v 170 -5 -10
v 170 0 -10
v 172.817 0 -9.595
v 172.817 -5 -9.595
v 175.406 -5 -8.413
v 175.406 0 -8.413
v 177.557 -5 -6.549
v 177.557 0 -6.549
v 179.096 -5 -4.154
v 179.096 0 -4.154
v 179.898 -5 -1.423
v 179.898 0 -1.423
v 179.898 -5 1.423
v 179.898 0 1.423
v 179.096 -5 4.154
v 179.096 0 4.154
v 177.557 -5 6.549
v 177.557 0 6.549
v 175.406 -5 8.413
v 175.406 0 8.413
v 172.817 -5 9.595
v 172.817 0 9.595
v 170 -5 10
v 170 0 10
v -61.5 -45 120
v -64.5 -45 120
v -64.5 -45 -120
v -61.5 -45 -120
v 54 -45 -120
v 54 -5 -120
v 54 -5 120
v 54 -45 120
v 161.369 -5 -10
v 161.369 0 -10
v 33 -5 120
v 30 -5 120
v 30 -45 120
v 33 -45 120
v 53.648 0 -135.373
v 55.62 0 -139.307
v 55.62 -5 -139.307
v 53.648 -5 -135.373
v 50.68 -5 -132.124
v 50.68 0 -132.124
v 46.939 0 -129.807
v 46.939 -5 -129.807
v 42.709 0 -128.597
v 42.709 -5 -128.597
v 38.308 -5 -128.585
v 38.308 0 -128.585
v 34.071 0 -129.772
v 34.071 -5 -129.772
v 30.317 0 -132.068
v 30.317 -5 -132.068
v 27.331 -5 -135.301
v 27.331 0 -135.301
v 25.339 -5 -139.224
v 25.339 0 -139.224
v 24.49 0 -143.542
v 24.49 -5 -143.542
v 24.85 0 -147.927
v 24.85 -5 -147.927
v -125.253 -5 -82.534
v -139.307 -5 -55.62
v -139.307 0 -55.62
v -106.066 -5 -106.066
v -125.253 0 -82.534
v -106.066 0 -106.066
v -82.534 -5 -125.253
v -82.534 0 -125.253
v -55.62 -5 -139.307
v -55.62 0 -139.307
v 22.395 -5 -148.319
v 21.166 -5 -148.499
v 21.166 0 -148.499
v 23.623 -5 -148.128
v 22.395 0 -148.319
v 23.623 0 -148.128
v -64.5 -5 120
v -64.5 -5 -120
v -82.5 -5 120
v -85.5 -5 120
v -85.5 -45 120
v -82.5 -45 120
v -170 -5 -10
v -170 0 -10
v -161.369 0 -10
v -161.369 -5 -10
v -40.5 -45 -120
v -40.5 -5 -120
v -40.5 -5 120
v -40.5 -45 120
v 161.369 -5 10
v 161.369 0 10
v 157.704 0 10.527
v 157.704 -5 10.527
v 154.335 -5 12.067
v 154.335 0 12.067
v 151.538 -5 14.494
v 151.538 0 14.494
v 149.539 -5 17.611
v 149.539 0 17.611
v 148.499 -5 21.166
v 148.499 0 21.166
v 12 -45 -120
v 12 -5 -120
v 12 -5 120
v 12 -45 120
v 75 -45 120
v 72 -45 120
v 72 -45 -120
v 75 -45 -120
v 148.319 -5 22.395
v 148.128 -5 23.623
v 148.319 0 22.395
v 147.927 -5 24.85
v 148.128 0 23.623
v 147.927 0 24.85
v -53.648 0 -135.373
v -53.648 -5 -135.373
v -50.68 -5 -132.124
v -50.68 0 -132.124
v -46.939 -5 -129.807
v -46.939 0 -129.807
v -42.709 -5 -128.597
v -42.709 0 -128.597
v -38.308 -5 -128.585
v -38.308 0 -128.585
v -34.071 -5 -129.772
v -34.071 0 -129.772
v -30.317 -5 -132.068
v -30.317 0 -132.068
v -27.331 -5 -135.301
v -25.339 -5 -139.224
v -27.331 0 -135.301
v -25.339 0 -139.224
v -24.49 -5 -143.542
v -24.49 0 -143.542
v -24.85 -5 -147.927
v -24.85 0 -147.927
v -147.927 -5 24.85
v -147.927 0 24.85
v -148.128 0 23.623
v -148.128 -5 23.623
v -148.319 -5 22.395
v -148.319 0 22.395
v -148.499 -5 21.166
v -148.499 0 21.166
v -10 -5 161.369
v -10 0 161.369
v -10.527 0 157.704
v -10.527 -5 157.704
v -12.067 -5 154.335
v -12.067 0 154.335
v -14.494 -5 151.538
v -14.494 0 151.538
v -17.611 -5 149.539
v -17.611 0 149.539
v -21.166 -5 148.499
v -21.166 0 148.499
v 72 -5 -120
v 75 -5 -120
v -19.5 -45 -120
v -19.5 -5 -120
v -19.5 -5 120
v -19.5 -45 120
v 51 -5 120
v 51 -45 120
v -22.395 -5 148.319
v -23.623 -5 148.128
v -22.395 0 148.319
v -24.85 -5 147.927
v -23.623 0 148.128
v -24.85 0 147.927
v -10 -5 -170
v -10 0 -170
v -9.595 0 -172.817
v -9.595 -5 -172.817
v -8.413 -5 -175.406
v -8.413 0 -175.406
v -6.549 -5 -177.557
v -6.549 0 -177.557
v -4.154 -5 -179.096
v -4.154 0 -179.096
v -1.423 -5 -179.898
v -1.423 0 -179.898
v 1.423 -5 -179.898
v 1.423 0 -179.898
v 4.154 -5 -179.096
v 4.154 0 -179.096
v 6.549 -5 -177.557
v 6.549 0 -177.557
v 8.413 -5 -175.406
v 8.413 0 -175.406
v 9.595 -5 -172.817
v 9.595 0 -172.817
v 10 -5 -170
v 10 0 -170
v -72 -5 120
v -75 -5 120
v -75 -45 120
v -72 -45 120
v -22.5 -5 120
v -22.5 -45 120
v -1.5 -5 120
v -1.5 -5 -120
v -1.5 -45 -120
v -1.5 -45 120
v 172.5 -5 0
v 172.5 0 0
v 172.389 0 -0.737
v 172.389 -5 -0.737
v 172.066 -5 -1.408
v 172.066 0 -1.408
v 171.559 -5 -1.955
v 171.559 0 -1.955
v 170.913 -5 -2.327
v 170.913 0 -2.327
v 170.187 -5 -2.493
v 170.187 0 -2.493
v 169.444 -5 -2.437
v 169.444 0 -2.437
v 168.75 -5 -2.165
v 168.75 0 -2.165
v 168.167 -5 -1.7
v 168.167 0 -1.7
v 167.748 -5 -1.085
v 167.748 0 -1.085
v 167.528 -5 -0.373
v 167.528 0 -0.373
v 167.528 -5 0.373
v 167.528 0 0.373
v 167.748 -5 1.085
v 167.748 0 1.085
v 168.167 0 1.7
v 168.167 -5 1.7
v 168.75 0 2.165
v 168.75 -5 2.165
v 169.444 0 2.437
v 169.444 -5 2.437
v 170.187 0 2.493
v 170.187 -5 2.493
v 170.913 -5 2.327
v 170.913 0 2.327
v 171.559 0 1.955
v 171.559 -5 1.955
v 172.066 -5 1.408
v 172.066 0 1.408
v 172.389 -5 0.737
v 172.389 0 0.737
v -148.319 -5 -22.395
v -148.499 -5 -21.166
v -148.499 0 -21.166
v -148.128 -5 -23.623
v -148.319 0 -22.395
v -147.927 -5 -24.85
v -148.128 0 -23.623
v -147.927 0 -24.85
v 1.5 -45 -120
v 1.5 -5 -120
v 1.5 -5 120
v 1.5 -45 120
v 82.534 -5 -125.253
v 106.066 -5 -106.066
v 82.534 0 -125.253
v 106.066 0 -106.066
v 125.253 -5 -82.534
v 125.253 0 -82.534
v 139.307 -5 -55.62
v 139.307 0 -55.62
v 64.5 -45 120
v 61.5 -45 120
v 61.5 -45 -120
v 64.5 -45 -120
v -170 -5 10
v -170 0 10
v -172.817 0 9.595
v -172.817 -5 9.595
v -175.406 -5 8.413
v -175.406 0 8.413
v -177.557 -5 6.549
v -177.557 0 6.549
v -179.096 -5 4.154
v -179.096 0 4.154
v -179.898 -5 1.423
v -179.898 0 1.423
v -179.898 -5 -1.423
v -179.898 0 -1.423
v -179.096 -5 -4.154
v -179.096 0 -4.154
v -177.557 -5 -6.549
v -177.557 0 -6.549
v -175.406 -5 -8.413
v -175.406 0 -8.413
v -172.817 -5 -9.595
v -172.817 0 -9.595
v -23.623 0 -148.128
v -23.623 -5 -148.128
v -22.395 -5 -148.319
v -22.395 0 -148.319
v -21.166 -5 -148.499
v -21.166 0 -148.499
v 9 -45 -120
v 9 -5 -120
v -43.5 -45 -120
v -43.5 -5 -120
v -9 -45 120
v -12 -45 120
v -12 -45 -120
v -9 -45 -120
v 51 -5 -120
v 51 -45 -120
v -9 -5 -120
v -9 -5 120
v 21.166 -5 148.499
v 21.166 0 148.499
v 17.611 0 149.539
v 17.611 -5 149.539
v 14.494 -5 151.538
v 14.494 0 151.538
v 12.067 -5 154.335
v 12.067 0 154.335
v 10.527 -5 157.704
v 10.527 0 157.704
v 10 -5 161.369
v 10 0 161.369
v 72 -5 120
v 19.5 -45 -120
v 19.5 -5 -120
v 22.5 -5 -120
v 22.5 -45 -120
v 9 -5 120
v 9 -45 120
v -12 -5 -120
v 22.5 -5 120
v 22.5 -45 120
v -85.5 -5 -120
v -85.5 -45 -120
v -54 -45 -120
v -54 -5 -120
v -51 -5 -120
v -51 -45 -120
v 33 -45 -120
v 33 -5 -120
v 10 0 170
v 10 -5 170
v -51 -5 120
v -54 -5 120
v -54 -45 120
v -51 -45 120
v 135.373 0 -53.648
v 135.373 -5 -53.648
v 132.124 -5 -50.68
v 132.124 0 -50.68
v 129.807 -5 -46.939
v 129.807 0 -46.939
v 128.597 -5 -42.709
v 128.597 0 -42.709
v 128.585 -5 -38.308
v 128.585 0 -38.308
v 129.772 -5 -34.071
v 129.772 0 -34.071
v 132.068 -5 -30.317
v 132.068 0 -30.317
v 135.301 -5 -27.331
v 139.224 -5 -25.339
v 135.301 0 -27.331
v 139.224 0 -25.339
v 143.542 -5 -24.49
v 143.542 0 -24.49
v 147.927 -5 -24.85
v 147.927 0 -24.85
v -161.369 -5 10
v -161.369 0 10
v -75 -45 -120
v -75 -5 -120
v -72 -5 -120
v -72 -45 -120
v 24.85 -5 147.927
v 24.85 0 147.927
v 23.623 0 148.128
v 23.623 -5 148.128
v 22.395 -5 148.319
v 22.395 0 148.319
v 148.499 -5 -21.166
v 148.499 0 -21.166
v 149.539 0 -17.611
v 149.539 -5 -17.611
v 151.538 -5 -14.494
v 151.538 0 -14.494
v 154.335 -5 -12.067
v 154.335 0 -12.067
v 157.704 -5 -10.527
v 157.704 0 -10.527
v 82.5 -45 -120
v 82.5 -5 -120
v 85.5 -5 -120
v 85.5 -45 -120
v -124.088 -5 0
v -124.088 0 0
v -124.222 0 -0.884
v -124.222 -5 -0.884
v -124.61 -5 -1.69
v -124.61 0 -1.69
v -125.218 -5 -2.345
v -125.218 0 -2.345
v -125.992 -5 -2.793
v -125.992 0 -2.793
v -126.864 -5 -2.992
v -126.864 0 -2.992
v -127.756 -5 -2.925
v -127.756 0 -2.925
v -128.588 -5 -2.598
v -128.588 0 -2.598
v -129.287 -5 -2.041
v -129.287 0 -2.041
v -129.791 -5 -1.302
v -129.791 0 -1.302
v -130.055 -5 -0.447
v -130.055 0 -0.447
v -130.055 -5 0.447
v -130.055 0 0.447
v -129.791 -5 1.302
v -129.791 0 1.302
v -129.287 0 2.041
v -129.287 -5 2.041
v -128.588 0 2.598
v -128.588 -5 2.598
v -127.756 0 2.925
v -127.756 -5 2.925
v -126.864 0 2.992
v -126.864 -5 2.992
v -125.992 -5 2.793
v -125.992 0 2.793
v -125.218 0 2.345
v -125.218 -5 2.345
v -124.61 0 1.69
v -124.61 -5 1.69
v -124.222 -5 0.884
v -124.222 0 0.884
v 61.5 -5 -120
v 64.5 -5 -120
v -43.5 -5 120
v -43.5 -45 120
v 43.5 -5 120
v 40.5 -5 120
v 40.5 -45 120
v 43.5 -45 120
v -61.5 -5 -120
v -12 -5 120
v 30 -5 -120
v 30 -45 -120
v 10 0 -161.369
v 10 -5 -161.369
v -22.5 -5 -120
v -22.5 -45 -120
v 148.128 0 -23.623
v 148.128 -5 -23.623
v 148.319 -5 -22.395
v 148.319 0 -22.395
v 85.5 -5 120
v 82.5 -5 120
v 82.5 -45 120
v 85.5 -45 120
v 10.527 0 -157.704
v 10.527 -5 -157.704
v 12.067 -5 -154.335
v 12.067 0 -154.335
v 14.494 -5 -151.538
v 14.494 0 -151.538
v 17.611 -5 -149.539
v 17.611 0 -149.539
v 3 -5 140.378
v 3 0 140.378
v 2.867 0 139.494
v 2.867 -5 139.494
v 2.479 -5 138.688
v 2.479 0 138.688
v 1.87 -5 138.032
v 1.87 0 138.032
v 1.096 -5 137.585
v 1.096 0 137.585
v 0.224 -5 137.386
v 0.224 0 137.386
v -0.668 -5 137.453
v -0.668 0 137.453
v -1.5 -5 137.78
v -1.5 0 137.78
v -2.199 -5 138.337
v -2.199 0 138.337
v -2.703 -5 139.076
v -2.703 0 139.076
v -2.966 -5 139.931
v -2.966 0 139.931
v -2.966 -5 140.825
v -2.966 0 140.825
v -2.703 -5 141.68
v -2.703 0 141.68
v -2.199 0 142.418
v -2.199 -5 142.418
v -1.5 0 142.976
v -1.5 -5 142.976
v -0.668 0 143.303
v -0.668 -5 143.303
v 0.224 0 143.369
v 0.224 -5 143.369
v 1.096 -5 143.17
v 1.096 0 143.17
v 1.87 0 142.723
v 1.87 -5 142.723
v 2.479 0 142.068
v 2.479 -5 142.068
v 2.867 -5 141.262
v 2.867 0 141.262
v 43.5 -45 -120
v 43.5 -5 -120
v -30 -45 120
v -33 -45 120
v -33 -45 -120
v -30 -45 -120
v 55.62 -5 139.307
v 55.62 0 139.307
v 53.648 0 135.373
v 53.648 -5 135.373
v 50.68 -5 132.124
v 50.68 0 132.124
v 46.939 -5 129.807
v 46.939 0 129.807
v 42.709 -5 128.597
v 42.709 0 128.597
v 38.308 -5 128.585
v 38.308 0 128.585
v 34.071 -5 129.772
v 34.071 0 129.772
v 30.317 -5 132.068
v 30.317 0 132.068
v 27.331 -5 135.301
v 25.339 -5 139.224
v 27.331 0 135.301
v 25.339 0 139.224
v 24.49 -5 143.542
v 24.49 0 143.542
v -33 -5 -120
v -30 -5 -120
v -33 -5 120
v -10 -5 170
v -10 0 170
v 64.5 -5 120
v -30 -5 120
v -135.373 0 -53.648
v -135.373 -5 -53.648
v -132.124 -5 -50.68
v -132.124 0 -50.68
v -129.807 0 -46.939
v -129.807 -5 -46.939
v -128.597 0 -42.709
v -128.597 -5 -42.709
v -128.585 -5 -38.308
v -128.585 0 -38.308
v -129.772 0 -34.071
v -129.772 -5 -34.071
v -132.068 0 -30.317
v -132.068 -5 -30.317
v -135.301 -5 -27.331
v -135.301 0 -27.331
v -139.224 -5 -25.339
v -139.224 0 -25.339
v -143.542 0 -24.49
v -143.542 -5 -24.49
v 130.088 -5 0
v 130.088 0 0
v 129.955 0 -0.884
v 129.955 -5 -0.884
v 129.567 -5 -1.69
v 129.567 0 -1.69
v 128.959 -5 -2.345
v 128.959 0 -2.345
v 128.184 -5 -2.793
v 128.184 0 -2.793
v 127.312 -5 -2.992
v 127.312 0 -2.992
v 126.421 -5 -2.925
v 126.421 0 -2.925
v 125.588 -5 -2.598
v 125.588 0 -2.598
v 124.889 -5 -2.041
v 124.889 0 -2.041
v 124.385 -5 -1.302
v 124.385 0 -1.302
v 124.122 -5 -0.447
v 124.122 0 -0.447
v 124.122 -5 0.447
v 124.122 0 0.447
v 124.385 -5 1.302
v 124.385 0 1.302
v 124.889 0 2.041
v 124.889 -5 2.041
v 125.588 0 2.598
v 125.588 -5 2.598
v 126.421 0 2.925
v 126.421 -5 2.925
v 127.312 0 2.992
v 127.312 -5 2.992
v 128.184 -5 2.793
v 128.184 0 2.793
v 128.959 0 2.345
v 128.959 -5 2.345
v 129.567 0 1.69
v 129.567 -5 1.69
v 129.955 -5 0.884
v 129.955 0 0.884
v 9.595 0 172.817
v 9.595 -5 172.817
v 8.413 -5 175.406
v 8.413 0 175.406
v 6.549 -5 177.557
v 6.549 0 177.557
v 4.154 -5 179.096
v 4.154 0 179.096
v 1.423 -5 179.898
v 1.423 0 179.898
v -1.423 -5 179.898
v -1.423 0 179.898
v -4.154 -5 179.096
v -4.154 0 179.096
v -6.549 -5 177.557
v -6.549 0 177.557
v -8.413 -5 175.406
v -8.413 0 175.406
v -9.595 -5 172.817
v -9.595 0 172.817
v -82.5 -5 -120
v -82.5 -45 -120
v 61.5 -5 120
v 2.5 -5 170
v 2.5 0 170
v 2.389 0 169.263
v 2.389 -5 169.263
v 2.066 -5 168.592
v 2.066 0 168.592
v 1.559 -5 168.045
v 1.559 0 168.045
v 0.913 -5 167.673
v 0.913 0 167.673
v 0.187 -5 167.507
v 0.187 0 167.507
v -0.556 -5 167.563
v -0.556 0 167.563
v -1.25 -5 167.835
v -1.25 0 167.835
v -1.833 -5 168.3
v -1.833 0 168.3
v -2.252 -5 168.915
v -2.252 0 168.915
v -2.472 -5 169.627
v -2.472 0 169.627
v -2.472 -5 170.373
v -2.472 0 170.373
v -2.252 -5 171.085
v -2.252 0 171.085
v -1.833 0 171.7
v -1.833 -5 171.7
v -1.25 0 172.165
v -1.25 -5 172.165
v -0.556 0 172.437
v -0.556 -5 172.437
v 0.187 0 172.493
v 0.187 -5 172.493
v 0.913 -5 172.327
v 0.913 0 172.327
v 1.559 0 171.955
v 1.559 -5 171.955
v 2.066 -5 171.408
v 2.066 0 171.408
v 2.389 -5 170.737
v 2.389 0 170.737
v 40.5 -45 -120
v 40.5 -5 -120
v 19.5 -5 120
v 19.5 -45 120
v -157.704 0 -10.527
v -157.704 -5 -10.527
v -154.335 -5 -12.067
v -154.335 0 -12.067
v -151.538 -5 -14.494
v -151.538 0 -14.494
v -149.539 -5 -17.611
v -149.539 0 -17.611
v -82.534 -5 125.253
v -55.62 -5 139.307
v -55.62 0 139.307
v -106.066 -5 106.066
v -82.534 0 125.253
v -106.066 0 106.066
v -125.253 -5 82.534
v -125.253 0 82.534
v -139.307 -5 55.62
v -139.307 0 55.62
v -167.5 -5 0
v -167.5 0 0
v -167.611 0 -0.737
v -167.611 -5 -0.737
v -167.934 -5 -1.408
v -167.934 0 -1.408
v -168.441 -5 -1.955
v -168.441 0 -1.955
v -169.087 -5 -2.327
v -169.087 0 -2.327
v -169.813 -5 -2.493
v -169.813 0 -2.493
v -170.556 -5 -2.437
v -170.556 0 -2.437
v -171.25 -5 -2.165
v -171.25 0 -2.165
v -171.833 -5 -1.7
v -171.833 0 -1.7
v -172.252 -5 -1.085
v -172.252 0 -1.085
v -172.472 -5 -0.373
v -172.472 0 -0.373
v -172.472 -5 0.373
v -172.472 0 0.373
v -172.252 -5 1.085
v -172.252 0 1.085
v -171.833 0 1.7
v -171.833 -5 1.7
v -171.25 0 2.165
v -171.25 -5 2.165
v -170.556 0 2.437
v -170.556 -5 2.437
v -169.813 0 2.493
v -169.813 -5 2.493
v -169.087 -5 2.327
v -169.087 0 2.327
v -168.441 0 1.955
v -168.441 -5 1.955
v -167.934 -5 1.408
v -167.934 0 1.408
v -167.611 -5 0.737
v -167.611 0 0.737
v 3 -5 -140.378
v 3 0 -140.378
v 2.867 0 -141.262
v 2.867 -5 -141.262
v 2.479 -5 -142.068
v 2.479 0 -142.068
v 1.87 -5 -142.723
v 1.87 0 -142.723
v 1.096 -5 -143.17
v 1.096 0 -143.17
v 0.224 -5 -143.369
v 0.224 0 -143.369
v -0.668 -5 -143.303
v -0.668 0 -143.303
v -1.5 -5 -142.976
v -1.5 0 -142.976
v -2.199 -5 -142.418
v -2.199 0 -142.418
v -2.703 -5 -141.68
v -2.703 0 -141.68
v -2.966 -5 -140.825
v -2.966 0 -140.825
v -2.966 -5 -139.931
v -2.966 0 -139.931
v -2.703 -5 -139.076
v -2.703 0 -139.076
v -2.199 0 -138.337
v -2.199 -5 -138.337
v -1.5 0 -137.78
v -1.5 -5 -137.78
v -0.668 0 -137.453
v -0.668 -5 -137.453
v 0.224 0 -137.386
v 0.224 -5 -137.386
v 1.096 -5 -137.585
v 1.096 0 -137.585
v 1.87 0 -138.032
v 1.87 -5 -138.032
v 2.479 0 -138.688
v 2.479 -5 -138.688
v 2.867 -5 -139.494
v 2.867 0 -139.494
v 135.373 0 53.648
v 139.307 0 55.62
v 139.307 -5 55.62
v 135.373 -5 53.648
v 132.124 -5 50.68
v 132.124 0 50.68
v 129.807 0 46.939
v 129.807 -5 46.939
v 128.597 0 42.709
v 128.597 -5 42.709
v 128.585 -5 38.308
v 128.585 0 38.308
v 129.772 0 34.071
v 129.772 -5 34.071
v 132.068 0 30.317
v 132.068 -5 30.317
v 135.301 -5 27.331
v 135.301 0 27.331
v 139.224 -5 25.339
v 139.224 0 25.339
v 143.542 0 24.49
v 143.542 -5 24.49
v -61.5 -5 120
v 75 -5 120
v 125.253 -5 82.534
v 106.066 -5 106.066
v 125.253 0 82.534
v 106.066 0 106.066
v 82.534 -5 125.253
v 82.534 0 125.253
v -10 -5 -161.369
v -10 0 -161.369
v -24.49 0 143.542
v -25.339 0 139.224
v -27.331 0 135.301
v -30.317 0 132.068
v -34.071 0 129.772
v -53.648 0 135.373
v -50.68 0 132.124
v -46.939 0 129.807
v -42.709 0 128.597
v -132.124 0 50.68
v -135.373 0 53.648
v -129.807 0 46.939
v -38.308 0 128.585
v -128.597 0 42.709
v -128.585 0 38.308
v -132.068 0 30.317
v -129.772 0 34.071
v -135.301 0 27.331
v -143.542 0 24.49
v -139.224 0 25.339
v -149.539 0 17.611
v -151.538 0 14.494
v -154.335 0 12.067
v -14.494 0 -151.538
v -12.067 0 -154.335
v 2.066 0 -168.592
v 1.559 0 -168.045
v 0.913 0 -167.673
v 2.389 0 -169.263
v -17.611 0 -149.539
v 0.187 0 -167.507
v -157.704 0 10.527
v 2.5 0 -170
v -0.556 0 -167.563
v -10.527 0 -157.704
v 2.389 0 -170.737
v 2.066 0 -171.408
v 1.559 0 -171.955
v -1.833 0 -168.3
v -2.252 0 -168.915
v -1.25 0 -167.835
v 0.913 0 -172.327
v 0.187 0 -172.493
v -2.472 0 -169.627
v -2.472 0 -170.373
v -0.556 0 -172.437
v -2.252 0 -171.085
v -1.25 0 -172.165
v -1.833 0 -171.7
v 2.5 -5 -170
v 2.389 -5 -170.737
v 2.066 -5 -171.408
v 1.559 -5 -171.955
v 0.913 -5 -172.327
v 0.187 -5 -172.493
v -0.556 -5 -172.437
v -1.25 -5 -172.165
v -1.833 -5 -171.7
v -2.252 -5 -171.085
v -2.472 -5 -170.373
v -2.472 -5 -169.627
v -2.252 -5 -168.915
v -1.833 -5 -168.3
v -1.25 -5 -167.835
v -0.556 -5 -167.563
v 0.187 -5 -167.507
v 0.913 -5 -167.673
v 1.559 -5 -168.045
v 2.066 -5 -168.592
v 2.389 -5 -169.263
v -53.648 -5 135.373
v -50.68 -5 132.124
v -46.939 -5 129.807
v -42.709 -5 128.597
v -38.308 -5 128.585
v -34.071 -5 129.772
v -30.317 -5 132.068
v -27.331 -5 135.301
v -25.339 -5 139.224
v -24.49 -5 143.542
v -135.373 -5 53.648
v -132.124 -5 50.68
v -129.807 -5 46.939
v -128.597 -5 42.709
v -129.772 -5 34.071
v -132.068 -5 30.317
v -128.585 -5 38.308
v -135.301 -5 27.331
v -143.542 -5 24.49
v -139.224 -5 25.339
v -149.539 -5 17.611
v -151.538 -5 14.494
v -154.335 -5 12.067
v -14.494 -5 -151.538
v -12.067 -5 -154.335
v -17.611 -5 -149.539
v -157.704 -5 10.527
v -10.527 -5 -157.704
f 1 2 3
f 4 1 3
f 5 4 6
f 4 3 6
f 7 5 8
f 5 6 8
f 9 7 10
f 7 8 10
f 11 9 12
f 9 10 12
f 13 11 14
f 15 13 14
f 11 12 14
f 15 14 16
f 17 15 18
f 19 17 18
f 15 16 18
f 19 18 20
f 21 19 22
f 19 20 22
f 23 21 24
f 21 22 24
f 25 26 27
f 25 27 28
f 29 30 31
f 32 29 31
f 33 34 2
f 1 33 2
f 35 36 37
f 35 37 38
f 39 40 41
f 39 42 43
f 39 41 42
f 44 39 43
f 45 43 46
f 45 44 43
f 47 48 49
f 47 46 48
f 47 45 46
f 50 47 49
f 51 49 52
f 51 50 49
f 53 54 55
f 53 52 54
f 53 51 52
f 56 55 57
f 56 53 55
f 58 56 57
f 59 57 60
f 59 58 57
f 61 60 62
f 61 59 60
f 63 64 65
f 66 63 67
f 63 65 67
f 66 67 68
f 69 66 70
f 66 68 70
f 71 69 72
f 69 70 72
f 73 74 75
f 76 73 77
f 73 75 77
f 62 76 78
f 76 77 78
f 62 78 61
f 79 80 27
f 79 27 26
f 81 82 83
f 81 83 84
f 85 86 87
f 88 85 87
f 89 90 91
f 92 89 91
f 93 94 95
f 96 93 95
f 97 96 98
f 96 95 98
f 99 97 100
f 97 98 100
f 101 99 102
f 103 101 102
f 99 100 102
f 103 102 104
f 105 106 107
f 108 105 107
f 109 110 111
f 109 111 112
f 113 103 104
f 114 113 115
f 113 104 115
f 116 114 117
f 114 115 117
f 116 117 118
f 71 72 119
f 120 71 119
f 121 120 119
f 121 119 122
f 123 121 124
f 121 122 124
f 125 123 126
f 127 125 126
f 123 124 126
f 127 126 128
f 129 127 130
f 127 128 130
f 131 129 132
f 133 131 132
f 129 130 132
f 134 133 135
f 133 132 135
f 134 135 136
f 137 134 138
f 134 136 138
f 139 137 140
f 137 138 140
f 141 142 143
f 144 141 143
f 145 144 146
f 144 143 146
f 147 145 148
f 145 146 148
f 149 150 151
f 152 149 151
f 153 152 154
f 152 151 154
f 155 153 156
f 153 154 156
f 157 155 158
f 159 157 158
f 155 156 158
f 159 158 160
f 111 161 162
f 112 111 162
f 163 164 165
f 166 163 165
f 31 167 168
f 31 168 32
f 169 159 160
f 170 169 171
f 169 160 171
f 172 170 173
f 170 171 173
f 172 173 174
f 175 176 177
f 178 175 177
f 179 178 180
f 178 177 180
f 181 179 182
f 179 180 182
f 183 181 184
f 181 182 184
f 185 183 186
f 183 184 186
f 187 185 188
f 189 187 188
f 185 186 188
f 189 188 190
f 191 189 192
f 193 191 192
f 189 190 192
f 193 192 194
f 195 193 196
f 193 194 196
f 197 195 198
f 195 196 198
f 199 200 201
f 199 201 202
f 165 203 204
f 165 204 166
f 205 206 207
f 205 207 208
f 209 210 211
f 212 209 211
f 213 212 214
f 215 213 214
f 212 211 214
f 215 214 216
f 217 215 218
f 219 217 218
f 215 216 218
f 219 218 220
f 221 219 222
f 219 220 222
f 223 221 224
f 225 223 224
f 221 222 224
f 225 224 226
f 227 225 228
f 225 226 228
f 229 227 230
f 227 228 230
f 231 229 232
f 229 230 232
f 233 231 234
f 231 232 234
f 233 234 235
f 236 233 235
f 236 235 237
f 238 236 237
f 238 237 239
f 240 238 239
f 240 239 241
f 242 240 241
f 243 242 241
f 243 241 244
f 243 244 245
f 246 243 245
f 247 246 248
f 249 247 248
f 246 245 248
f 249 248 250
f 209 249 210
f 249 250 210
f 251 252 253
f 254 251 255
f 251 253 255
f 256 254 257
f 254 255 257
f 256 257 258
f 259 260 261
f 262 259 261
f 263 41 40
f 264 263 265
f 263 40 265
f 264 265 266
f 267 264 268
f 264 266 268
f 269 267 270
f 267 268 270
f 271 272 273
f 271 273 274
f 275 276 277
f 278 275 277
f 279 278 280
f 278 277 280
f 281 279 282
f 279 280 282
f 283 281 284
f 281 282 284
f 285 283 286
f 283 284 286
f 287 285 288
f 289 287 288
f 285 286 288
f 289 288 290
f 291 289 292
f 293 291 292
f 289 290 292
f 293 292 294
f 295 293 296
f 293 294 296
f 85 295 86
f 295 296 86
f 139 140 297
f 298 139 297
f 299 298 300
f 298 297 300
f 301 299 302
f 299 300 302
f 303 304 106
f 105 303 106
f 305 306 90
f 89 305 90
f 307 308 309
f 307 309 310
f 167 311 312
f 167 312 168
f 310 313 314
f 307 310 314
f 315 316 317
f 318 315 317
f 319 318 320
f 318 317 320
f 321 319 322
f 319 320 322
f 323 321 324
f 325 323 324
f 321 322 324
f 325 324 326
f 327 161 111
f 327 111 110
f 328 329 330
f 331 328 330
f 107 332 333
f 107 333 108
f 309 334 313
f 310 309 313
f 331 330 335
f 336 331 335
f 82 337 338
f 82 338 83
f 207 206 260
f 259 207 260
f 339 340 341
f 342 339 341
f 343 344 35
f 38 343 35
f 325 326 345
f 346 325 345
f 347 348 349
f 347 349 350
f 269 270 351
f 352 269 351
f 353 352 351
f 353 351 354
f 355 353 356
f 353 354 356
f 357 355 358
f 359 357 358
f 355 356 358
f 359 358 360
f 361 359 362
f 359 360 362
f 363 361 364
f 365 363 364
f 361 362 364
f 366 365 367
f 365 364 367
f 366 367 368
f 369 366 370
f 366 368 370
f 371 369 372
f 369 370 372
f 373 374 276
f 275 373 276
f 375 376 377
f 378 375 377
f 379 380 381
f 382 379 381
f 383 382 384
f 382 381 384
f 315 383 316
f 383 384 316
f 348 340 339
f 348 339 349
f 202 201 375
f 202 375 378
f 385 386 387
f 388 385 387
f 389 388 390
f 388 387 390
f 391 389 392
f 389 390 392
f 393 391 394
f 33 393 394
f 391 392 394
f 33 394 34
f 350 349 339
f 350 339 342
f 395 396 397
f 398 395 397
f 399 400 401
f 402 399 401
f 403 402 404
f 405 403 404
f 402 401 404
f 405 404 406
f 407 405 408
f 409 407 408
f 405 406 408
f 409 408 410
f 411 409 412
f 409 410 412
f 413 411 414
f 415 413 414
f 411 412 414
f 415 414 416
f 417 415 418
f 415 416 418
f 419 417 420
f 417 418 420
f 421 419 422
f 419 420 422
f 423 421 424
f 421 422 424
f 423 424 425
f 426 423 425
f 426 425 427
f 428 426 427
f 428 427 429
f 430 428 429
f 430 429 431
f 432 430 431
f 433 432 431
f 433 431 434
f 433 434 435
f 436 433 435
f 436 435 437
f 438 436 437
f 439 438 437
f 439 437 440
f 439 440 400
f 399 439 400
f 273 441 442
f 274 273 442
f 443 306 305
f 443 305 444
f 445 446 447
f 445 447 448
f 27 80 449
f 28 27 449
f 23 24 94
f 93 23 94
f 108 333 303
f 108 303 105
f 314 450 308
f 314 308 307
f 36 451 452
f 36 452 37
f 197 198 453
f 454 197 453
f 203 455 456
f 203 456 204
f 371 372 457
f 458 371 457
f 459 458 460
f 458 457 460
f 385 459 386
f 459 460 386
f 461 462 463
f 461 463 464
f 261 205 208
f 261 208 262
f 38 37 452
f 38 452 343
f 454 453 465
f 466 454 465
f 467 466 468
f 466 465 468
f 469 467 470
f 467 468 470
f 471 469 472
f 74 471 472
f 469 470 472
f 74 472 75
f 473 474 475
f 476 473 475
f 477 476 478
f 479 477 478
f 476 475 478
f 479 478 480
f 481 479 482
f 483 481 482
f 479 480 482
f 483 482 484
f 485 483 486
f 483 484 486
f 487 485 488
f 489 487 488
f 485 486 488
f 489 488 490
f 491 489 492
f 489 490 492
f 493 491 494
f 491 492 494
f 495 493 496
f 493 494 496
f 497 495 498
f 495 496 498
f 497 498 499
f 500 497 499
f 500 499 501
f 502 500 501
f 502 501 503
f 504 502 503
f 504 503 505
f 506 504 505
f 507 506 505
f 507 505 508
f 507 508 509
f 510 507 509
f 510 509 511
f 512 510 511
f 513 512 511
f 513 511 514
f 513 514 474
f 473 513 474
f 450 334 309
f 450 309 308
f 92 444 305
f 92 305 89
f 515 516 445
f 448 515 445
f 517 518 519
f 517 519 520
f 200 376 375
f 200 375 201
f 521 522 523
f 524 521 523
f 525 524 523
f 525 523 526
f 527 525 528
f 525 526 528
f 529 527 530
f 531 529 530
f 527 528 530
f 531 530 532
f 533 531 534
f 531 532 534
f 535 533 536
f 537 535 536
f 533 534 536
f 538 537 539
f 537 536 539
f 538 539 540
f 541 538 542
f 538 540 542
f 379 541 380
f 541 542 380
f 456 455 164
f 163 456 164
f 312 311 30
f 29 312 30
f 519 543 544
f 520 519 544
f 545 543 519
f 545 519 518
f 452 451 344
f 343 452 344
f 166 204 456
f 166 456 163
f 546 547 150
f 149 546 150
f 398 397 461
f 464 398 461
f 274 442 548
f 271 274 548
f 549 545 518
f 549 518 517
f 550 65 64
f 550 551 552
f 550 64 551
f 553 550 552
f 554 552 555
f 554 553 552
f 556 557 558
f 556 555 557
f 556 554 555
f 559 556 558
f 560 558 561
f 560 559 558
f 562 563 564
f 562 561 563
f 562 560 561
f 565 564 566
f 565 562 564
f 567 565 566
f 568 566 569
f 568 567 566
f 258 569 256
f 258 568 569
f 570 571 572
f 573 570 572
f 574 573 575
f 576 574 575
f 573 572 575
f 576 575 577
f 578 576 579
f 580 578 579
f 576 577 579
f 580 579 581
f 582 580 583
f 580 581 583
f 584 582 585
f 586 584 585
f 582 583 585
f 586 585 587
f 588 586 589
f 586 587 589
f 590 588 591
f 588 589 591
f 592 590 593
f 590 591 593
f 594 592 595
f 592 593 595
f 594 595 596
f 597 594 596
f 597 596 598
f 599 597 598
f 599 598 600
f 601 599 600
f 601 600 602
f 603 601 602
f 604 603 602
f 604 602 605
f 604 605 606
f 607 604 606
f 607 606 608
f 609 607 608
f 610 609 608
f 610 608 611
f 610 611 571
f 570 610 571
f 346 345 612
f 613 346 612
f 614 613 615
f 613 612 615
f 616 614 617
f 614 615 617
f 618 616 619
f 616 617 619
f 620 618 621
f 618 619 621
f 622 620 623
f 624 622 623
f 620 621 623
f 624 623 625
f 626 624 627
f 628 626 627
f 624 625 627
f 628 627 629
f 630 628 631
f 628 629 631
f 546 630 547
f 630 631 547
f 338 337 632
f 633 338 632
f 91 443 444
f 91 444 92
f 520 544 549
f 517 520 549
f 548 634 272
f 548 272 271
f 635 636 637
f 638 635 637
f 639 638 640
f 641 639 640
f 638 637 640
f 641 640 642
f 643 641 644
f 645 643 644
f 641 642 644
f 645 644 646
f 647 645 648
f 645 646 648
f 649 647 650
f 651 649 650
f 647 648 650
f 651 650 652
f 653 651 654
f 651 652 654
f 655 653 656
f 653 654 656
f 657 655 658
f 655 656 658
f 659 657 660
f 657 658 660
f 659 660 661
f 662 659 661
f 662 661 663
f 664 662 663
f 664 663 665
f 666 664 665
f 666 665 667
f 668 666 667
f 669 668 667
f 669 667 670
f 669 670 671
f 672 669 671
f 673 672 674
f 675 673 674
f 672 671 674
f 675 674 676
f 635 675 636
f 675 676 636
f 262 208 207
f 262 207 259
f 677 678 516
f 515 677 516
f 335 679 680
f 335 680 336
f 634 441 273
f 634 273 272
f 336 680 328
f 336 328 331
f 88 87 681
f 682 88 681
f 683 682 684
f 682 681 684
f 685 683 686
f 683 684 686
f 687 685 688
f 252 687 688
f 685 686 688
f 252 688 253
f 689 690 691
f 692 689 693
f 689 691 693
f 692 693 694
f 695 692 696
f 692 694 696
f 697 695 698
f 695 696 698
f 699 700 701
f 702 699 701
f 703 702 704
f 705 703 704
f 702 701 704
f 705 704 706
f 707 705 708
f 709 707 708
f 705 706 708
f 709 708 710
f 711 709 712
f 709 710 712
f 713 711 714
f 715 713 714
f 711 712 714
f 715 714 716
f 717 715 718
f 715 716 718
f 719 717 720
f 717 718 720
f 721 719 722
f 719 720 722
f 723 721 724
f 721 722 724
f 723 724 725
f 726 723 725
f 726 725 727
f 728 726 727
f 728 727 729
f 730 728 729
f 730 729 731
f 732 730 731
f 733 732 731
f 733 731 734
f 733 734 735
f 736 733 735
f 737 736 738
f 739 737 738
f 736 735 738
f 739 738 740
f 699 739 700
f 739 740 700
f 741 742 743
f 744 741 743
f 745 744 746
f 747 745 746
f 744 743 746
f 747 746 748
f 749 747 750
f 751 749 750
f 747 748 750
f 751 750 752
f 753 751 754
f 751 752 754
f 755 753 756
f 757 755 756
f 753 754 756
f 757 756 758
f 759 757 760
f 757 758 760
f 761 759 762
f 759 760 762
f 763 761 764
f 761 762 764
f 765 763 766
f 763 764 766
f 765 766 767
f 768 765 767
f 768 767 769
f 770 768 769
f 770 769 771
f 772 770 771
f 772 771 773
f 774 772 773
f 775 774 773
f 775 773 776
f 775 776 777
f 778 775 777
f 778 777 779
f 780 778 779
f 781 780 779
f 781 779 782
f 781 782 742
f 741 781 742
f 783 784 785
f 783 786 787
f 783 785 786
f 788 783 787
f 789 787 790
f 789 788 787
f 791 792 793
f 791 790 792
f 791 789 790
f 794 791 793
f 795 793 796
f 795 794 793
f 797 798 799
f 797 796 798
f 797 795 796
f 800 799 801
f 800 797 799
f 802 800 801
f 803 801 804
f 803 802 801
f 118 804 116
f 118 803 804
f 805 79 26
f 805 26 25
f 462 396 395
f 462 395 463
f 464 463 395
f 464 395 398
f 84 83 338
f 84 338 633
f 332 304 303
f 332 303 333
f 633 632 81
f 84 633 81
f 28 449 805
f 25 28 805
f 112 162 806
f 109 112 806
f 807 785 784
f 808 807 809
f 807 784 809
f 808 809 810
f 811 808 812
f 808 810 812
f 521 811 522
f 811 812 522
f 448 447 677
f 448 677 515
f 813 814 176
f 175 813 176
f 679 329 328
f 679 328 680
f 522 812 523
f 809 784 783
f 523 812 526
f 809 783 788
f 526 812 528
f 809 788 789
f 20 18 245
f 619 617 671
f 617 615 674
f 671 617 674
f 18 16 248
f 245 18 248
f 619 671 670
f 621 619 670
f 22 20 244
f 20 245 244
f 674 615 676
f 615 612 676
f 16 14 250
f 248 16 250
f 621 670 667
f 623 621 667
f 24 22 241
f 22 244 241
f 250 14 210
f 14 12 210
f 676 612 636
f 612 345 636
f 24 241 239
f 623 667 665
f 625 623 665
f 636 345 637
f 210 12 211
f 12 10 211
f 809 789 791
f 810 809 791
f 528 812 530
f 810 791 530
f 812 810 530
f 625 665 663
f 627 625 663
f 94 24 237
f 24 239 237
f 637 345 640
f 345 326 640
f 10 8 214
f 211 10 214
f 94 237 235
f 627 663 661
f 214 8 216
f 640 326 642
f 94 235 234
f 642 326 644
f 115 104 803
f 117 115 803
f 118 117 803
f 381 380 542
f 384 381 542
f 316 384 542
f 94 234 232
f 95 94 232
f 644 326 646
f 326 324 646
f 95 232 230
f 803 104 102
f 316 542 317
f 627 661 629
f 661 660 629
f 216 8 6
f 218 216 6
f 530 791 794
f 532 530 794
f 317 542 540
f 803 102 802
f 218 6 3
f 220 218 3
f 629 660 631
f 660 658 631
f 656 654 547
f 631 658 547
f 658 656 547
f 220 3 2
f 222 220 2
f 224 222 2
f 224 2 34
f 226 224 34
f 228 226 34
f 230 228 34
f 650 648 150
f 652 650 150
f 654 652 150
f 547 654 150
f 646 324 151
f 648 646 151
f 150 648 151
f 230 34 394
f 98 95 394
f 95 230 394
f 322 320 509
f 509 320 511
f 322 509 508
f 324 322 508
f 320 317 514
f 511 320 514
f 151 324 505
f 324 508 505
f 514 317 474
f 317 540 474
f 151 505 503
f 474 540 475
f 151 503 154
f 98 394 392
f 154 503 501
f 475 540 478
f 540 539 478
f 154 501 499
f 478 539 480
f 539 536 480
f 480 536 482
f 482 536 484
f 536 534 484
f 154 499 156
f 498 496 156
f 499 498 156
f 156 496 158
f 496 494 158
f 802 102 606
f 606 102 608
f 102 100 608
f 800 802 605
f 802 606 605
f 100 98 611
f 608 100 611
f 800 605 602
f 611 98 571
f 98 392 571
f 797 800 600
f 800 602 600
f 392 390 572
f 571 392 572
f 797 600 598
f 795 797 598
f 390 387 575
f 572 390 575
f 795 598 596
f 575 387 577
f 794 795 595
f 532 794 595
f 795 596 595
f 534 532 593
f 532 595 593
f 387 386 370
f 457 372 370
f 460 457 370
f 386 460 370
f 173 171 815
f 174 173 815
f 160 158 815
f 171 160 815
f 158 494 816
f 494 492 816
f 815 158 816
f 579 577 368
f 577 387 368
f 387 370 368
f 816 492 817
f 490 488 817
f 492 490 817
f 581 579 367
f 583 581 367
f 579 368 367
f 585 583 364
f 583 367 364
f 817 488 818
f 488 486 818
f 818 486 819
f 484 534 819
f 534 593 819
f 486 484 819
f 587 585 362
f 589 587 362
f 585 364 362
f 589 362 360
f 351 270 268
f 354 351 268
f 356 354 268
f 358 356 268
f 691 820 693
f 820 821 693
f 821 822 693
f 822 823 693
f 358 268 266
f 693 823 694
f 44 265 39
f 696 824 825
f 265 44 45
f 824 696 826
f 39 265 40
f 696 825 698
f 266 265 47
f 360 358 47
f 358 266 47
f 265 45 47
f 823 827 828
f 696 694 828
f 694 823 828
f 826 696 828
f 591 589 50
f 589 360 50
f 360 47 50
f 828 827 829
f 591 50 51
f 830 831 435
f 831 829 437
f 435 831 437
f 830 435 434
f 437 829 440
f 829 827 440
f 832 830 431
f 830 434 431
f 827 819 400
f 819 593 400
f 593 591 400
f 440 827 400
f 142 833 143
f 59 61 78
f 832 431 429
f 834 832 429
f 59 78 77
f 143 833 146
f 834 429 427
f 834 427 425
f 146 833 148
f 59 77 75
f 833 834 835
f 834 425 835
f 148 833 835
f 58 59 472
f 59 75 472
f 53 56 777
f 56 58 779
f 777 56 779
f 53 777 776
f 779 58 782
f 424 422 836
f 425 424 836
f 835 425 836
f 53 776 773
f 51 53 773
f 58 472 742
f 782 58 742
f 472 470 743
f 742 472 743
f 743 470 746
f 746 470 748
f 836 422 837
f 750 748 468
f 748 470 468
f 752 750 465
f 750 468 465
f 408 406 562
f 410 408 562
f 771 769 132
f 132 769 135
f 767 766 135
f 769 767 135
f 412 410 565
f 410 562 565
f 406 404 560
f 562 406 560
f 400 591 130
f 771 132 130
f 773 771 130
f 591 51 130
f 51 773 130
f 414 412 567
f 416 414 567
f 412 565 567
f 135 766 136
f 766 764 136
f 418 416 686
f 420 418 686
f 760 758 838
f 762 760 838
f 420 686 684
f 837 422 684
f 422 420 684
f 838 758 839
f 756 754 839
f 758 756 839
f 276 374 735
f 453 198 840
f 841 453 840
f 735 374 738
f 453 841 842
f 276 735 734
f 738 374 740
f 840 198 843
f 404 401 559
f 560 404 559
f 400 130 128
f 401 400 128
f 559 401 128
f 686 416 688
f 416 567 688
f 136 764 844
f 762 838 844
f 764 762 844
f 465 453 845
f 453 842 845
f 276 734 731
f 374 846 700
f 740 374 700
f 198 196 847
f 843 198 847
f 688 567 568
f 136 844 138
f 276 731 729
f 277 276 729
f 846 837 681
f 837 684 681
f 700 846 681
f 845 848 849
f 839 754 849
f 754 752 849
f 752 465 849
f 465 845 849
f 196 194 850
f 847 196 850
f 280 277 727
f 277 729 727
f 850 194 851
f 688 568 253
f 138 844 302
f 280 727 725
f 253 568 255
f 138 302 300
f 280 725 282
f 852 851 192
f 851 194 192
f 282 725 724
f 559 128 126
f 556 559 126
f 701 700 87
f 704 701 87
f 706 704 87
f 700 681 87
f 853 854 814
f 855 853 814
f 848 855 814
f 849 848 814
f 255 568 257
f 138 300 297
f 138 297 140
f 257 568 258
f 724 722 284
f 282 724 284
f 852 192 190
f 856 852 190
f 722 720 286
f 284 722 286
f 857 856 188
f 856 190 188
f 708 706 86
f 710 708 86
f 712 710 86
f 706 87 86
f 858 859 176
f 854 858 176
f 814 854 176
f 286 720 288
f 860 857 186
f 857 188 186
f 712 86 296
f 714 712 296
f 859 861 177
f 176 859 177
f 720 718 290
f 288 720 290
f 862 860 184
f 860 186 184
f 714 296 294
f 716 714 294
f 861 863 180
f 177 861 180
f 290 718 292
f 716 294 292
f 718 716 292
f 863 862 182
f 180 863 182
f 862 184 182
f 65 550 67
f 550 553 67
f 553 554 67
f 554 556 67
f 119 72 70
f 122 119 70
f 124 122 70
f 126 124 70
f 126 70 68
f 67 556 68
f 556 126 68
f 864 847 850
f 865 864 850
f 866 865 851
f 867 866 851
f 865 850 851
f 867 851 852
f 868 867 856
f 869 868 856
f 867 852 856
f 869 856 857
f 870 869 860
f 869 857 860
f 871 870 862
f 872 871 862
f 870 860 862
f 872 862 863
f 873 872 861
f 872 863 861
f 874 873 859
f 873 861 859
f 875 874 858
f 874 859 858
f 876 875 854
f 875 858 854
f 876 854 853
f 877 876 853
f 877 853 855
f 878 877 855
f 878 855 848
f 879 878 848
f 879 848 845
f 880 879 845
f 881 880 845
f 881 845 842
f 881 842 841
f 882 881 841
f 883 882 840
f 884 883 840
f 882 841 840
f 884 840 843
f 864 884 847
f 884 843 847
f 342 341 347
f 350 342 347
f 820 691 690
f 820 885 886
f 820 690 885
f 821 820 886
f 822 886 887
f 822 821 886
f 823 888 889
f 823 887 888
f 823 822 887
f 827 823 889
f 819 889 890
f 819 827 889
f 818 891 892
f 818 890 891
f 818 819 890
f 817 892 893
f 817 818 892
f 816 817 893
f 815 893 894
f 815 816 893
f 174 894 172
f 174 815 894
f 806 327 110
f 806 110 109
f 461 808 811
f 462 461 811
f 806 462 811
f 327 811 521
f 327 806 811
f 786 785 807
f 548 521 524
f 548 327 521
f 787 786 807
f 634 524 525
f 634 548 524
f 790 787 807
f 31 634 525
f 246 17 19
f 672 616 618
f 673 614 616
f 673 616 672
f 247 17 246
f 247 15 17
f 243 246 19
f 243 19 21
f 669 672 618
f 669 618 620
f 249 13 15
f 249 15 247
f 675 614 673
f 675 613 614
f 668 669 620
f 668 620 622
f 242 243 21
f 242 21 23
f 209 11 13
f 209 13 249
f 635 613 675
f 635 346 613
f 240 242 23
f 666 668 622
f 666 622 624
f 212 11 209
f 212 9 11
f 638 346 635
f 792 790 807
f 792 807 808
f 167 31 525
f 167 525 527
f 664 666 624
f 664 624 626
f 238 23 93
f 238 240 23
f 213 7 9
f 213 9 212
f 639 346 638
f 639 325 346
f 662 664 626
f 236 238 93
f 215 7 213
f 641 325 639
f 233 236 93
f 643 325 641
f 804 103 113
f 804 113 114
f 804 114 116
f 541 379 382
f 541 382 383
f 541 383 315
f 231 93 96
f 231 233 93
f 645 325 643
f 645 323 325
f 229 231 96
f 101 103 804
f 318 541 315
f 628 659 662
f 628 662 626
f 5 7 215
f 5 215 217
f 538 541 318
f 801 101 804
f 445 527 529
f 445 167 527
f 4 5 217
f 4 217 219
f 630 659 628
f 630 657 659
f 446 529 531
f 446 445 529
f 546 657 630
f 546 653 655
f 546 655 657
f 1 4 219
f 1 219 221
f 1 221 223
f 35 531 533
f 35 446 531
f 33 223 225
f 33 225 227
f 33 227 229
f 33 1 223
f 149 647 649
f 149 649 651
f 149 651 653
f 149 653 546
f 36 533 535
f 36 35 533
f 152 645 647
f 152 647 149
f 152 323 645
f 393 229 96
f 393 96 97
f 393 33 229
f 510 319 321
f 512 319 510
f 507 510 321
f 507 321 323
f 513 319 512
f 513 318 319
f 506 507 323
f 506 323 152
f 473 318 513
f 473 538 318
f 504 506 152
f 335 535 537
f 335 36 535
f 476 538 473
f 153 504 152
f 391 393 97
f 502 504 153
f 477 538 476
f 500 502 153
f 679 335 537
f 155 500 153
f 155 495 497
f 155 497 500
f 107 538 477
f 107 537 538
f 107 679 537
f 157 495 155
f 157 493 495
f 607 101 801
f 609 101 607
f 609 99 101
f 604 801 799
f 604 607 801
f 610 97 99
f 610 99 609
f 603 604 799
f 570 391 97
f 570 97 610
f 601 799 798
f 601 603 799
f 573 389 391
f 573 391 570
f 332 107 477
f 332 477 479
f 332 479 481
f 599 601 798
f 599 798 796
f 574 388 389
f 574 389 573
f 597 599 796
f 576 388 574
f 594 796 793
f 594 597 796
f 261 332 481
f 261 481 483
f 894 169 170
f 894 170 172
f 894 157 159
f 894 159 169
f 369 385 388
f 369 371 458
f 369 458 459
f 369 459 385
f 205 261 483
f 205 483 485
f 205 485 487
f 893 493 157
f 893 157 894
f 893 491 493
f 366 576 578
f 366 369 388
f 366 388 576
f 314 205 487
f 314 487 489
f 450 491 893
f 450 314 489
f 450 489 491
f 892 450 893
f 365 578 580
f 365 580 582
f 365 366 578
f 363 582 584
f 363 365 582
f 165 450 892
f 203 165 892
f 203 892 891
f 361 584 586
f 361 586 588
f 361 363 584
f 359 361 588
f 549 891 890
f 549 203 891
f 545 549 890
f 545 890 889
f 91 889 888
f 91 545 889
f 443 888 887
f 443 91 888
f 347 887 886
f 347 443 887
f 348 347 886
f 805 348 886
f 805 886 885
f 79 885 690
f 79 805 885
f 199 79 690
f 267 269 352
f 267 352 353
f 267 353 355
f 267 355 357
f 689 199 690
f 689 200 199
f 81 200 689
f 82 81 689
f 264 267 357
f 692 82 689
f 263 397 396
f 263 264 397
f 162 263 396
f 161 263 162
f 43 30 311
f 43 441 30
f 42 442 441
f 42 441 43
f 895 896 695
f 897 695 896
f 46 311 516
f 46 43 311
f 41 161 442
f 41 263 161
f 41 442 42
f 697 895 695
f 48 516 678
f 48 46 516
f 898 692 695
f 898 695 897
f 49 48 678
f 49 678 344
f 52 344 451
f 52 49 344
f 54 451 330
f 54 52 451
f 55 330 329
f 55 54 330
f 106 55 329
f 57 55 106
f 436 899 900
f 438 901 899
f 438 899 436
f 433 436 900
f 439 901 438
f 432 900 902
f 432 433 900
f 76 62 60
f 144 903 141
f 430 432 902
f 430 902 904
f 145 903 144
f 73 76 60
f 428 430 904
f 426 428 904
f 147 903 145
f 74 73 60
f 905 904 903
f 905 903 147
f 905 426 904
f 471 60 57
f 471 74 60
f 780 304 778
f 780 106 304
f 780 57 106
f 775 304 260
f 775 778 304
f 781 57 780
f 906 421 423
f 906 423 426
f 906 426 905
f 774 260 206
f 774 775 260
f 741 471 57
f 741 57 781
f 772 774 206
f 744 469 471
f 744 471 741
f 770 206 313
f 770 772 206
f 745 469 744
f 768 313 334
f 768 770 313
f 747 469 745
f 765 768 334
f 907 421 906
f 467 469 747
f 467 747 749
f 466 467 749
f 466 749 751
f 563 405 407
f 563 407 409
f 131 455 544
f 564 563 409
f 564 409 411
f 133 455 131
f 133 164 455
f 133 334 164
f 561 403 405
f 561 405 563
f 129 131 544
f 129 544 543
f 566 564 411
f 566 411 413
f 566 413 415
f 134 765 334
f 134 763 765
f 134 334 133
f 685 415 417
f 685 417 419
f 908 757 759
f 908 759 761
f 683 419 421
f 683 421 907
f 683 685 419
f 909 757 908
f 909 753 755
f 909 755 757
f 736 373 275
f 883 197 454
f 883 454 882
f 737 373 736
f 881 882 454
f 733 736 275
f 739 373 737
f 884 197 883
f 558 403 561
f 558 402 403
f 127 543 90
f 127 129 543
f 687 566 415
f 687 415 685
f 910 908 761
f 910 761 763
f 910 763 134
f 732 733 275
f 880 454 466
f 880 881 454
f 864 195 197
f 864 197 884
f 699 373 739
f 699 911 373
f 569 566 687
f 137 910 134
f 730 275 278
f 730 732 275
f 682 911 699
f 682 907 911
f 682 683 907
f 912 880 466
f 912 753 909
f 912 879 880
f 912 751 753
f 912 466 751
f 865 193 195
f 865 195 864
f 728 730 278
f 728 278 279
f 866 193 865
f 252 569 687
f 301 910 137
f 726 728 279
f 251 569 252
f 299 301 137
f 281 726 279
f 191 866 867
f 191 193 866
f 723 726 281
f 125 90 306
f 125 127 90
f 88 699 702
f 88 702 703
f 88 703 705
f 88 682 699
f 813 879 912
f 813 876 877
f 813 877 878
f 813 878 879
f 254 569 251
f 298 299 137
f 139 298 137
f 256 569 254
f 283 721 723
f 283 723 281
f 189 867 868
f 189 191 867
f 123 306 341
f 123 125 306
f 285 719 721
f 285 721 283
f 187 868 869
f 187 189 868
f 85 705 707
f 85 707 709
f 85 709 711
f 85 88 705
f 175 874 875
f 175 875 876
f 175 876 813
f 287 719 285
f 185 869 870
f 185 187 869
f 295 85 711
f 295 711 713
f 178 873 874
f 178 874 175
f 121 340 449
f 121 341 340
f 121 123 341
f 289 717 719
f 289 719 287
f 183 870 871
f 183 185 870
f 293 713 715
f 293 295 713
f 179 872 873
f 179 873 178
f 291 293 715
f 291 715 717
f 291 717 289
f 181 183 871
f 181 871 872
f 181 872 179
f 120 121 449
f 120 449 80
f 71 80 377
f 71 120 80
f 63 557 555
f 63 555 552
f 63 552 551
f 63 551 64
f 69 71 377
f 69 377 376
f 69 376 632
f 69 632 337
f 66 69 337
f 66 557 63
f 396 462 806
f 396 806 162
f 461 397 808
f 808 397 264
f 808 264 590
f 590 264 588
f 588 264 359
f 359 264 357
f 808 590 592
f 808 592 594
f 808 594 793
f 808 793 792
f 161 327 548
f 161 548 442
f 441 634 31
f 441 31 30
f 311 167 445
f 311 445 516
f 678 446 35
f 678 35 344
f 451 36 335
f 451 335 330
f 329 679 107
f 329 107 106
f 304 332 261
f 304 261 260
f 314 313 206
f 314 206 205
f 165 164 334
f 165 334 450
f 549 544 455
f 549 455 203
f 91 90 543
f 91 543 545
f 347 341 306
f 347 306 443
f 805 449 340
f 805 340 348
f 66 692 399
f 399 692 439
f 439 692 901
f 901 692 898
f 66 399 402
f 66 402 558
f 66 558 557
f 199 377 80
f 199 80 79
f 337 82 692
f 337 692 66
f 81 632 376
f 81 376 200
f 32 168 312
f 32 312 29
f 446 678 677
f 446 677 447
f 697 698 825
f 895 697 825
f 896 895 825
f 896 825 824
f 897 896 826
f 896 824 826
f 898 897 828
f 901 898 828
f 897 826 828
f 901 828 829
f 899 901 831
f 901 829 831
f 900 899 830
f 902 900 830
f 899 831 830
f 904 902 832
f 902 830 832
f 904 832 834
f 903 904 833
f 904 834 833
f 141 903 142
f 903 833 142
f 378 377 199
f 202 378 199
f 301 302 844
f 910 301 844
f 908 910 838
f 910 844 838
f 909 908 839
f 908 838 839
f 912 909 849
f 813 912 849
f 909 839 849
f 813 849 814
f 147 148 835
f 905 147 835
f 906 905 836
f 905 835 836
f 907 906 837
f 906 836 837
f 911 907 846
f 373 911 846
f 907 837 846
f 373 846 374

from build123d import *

# Parameters (mm, degrees)
SKETCH3_R           = 2.5
BOSS_EXTRUDE4_DEPTH = 5
SKETCH4_W           = 3
SKETCH4_H           = 240
BOSS_EXTRUDE5_DEPTH = 40
SKETCH7_R           = 3
CUT_EXTRUDE1_DEPTH  = 10
CUT_EXTRUDE2_DEPTH  = 10


with BuildPart() as part:
    # Sketch3 → Boss-Extrude4 (new body)
    with BuildSketch(Plane(origin=(0, 0, 0), x_dir=(1, 0, 0), z_dir=(0, 1, 0))):
        with BuildLine():
            Line((161.369142032, 10), (170, 10))
            ThreePointArc((170, 10), (180, 0), (170, -10))
            Line((170, -10), (161.369142032, -10))
            ThreePointArc((161.369142032, -10), (152.849946816, -13.180462695), (148.499210458, -21.165644172))
            ThreePointArc((148.499210458, -21.165644172), (106.066017178, -106.066017178), (21.165644172, -148.499210458))
            ThreePointArc((21.165644172, -148.499210458), (13.180462695, -152.849946816), (10, -161.369142032))
            Line((10, -161.369142032), (10, -170))
            ThreePointArc((10, -170), (0, -180), (-10, -170))
            Line((-10, -170), (-10, -161.369142032))
            ThreePointArc((-10, -161.369142032), (-13.180462695, -152.849946816), (-21.165644172, -148.499210458))
            ThreePointArc((-21.165644172, -148.499210458), (-106.066017178, -106.066017178), (-148.499210458, -21.165644172))
            ThreePointArc((-148.499210458, -21.165644172), (-152.849946816, -13.180462695), (-161.369142032, -10))
            Line((-161.369142032, -10), (-170, -10))
            ThreePointArc((-170, -10), (-180, 0), (-170, 10))
            Line((-170, 10), (-161.369142032, 10))
            ThreePointArc((-161.369142032, 10), (-152.849946816, 13.180462695), (-148.499210458, 21.165644172))
            ThreePointArc((-148.499210458, 21.165644172), (-106.066017178, 106.066017178), (-21.165644172, 148.499210458))
            ThreePointArc((-21.165644172, 148.499210458), (-13.180462695, 152.849946816), (-10, 161.369142032))
            Line((-10, 161.369142032), (-10, 170))
            ThreePointArc((-10, 170), (0, 180), (10, 170))
            Line((10, 170), (10, 161.369142032))
            ThreePointArc((10, 161.369142032), (13.180462695, 152.849946816), (21.165644172, 148.499210458))
            ThreePointArc((21.165644172, 148.499210458), (106.066017178, 106.066017178), (148.499210458, 21.165644172))
            ThreePointArc((148.499210458, 21.165644172), (152.849946816, 13.180462695), (161.369142032, 10))
        make_face()
        with Locations((0, 170)):
            Circle(SKETCH3_R, mode=Mode.SUBTRACT)
        with Locations((170, 0)):
            Circle(SKETCH3_R, mode=Mode.SUBTRACT)
        with Locations((0, -170)):
            Circle(SKETCH3_R, mode=Mode.SUBTRACT)
        with Locations((-170, 0)):
            Circle(SKETCH3_R, mode=Mode.SUBTRACT)
    extrude(amount=-BOSS_EXTRUDE4_DEPTH)

    # Sketch4 → Boss-Extrude5 (add)
    with BuildSketch(Plane.XZ.offset(5)):
        Rectangle(SKETCH4_W, SKETCH4_H)
        with Locations((10.5, 0)):
            Rectangle(SKETCH4_W, SKETCH4_H)
        with Locations((21, 0)):
            Rectangle(SKETCH4_W, SKETCH4_H)
        with Locations((31.5, 0)):
            Rectangle(SKETCH4_W, SKETCH4_H)
        with Locations((42, 0)):
            Rectangle(SKETCH4_W, SKETCH4_H)
        with Locations((52.5, 0)):
            Rectangle(SKETCH4_W, SKETCH4_H)
        with Locations((63, 0)):
            Rectangle(SKETCH4_W, SKETCH4_H)
        with Locations((73.5, 0)):
            Rectangle(SKETCH4_W, SKETCH4_H)
        with Locations((84, 0)):
            Rectangle(SKETCH4_W, SKETCH4_H)
        with Locations((-84, 0)):
            Rectangle(SKETCH4_W, SKETCH4_H)
        with Locations((-73.5, 0)):
            Rectangle(SKETCH4_W, SKETCH4_H)
        with Locations((-63, 0)):
            Rectangle(SKETCH4_W, SKETCH4_H)
        with Locations((-52.5, 0)):
            Rectangle(SKETCH4_W, SKETCH4_H)
        with Locations((-42, 0)):
            Rectangle(SKETCH4_W, SKETCH4_H)
        with Locations((-31.5, 0)):
            Rectangle(SKETCH4_W, SKETCH4_H)
        with Locations((-21, 0)):
            Rectangle(SKETCH4_W, SKETCH4_H)
        with Locations((-10.5, 0)):
            Rectangle(SKETCH4_W, SKETCH4_H)
    extrude(amount=BOSS_EXTRUDE5_DEPTH)

    # Sketch7 → Cut-Extrude1 (cut)
    with BuildSketch(Plane(origin=(0, 0, 0), x_dir=(1, 0, 0), z_dir=(0, 1, 0))):
        with Locations((-127.088241501, 0)):
            Circle(SKETCH7_R)
        with Locations((0, 140.377871213)):
            Circle(SKETCH7_R)
        with Locations((0, -140.377871213)):
            Circle(SKETCH7_R)
        with Locations((127.088241501, 0)):
            Circle(SKETCH7_R)
    extrude(amount=-CUT_EXTRUDE1_DEPTH, mode=Mode.SUBTRACT)

    # Sketch8 → Cut-Extrude2 (cut)
    with BuildSketch(Plane(origin=(0, 0, 0), x_dir=(1, 0, 0), z_dir=(0, 1, 0))):
        with BuildLine():
            ThreePointArc((24.849797215, -147.927305047), (40.464884917, -144.438890499), (55.619572151, -139.307082353))
            ThreePointArc((55.619572151, -139.307082353), (36.148630526, -129.032075513), (24.849797215, -147.927305047))
        make_face()
        with BuildLine():
            ThreePointArc((-55.619572151, -139.307082353), (-36.148630526, -129.032075513), (-24.849797215, -147.927305047))
            ThreePointArc((-24.849797215, -147.927305047), (-40.464884917, -144.438890499), (-55.619572151, -139.307082353))
        make_face()
        with BuildLine():
            ThreePointArc((-139.307082353, -55.619572151), (-129.032075513, -36.148630526), (-147.927305047, -24.849797215))
            ThreePointArc((-147.927305047, -24.849797215), (-144.438890499, -40.464884917), (-139.307082353, -55.619572151))
        make_face()
        with BuildLine():
            ThreePointArc((-139.307082353, 55.619572151), (-129.032075513, 36.148630526), (-147.927305047, 24.849797215))
            ThreePointArc((-147.927305047, 24.849797215), (-144.438890499, 40.464884917), (-139.307082353, 55.619572151))
        make_face()
        with BuildLine():
            ThreePointArc((-55.619572151, 139.307082353), (-36.148630526, 129.032075513), (-24.849797215, 147.927305047))
            ThreePointArc((-24.849797215, 147.927305047), (-40.464884917, 144.438890499), (-55.619572151, 139.307082353))
        make_face()
        with BuildLine():
            ThreePointArc((55.619572151, 139.307082353), (36.148630526, 129.032075513), (24.849797215, 147.927305047))
            ThreePointArc((24.849797215, 147.927305047), (40.464884917, 144.438890499), (55.619572151, 139.307082353))
        make_face()
        with BuildLine():
            ThreePointArc((139.307082353, 55.619572151), (129.032075513, 36.148630526), (147.927305047, 24.849797215))
            ThreePointArc((147.927305047, 24.849797215), (144.438890499, 40.464884917), (139.307082353, 55.619572151))
        make_face()
        with BuildLine():
            ThreePointArc((139.307082353, -55.619572151), (129.032075513, -36.148630526), (147.927305047, -24.849797215))
            ThreePointArc((147.927305047, -24.849797215), (144.438890499, -40.464884917), (139.307082353, -55.619572151))
        make_face()
    extrude(amount=-CUT_EXTRUDE2_DEPTH, mode=Mode.SUBTRACT)


solid = part.part
